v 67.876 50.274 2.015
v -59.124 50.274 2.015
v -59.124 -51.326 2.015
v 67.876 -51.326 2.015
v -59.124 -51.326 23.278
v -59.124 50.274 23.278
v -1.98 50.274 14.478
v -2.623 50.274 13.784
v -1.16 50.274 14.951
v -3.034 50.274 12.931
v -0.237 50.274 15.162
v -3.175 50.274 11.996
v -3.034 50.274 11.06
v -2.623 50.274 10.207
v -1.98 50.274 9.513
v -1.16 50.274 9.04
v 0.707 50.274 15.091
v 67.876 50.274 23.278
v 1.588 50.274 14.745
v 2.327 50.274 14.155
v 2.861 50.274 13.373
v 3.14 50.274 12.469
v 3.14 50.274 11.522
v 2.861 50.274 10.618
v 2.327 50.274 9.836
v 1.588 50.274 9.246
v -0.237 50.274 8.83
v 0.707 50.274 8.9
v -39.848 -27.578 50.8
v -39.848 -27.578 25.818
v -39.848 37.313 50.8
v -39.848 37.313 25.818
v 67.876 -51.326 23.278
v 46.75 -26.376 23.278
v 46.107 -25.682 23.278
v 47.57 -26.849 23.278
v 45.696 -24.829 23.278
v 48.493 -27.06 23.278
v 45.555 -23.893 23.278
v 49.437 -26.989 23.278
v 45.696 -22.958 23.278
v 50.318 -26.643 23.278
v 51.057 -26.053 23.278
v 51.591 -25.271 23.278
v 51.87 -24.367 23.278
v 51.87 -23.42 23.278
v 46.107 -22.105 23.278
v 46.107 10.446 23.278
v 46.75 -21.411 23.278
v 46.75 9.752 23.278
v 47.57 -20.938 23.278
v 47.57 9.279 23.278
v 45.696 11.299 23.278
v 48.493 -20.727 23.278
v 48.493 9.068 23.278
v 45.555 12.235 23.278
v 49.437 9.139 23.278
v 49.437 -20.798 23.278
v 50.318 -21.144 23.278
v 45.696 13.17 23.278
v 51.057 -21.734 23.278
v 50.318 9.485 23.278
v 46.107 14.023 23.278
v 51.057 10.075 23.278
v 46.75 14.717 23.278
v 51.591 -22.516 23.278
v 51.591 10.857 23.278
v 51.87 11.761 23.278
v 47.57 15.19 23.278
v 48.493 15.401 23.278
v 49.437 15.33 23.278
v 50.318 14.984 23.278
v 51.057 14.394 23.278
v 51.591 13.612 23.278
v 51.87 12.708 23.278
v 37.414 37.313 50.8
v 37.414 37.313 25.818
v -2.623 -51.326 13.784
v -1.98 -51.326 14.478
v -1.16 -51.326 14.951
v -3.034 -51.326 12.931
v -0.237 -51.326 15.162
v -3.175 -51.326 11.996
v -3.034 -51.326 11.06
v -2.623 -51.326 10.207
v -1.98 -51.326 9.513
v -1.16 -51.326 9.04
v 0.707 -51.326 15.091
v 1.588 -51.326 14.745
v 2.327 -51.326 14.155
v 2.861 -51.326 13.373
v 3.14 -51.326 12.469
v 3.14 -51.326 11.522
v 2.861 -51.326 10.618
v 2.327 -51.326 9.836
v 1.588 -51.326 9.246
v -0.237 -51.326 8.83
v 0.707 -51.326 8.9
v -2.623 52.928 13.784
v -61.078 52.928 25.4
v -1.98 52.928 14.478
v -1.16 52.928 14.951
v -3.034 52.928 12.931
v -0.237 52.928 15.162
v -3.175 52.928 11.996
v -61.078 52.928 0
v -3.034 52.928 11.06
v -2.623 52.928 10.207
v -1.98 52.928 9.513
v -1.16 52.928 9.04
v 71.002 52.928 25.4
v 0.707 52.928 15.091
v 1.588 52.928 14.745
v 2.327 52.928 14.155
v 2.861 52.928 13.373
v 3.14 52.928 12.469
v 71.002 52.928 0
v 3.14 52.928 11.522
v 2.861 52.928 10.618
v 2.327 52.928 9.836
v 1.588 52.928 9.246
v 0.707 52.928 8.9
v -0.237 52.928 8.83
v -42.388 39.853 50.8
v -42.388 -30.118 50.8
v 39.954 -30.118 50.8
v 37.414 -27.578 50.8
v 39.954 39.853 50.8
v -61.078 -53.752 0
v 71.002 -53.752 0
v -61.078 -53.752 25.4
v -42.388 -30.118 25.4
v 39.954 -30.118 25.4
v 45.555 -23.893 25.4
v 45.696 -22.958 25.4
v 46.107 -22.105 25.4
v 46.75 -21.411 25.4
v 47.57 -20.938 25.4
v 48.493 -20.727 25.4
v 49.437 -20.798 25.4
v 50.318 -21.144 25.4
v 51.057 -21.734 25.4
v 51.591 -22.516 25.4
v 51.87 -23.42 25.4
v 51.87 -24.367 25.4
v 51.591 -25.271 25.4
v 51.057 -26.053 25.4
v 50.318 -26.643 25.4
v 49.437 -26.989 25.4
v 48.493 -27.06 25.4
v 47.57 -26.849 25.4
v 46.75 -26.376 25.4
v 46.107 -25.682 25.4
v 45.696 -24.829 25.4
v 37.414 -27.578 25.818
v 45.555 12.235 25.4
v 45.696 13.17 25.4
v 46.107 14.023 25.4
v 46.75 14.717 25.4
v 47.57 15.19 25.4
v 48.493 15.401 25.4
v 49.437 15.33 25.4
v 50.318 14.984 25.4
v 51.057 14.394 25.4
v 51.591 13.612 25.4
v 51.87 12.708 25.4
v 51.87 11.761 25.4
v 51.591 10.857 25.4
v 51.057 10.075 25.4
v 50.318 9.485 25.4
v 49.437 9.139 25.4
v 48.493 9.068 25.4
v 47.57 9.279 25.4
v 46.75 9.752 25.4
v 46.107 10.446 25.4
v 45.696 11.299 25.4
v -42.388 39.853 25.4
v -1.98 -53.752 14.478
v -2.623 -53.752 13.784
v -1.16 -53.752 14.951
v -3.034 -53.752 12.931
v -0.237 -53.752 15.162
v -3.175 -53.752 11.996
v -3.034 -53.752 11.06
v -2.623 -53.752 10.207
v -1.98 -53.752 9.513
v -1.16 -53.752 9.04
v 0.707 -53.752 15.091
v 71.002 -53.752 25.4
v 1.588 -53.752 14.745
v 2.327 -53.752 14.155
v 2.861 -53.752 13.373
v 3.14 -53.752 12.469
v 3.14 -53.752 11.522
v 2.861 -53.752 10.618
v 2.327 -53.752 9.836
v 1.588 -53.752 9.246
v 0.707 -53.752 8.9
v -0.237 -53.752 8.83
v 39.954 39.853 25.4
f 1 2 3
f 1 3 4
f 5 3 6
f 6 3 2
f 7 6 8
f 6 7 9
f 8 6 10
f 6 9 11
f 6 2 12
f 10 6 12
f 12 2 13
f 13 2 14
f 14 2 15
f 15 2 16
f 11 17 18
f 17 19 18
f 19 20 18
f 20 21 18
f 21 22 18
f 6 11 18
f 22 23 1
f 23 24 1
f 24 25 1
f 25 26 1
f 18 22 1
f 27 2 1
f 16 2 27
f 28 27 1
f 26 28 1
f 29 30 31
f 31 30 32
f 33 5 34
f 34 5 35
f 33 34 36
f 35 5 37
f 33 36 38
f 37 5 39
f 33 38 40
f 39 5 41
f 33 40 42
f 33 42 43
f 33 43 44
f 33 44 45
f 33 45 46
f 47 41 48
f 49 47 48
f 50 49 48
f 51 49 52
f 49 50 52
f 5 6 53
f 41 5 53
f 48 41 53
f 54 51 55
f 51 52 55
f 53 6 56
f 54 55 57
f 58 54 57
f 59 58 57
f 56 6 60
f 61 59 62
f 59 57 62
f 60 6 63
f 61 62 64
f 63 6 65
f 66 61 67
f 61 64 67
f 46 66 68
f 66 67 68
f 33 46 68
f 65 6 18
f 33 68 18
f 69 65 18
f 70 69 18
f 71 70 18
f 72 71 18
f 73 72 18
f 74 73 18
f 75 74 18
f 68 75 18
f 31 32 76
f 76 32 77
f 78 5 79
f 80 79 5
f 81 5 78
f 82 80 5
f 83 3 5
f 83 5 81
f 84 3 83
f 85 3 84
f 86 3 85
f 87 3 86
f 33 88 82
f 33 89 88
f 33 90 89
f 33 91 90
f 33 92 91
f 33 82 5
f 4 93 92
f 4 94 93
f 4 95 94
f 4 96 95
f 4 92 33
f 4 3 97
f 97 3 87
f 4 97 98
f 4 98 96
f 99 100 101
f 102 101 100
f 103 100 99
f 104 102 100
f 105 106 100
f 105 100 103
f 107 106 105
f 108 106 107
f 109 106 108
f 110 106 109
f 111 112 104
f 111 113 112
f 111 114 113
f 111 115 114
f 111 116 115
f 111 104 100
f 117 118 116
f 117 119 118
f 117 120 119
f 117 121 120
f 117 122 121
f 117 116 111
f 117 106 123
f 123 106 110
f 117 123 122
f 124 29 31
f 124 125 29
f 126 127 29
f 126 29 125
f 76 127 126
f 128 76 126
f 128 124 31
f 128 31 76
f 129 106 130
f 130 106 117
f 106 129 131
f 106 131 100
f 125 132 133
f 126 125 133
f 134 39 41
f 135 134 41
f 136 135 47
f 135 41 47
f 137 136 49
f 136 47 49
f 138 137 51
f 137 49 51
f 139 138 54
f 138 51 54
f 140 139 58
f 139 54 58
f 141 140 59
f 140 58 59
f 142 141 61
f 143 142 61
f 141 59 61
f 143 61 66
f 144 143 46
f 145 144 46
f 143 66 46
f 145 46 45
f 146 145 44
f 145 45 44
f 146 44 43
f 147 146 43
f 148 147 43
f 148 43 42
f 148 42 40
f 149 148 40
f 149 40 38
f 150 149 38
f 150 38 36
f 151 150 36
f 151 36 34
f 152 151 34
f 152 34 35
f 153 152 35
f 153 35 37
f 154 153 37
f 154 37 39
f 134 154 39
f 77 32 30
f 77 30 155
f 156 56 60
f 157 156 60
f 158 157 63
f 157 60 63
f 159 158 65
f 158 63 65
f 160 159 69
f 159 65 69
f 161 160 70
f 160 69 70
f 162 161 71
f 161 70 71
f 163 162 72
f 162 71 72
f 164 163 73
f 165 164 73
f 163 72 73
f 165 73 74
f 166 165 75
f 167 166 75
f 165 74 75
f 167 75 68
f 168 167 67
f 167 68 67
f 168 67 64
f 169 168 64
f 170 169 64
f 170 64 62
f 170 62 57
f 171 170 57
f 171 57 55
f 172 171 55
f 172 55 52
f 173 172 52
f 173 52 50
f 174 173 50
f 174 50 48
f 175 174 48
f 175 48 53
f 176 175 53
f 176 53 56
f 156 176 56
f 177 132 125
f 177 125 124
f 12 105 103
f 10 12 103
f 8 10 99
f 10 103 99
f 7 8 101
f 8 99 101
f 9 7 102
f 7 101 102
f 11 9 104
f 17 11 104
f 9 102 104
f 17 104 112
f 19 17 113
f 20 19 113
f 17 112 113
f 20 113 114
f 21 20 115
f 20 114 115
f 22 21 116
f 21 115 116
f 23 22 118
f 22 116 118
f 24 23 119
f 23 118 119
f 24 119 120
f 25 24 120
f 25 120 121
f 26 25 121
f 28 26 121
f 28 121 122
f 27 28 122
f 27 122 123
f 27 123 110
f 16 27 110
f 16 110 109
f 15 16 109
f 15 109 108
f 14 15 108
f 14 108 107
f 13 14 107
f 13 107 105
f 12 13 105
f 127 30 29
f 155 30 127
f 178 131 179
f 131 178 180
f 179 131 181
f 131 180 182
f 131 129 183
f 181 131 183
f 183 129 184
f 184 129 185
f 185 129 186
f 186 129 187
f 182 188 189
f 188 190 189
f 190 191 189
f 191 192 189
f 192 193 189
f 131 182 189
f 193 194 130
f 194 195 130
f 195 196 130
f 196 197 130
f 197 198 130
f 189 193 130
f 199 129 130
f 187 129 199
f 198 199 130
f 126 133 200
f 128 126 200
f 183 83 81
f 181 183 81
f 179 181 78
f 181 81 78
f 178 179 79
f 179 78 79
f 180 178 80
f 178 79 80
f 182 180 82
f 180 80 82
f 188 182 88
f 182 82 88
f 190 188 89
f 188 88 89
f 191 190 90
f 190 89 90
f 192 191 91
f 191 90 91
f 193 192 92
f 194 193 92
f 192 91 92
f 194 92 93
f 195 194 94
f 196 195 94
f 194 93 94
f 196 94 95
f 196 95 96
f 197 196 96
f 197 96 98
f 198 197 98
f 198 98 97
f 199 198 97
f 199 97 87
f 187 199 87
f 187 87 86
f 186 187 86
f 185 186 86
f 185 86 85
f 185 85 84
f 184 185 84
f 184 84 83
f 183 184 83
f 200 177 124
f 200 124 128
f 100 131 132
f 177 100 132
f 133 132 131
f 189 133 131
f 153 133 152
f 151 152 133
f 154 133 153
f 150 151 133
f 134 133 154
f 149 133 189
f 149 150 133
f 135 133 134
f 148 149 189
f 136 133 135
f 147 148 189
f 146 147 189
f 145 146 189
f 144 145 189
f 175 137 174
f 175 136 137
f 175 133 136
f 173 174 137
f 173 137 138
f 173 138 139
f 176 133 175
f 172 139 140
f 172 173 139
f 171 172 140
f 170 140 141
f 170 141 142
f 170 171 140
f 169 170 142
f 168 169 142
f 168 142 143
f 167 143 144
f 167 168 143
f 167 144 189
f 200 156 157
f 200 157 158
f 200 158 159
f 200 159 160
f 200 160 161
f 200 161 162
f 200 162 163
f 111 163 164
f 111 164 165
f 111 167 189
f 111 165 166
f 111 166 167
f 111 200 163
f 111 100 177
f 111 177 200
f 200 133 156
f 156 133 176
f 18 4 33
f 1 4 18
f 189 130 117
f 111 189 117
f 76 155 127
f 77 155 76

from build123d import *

# Parameters (mm, degrees)
F0_W      = 132.08
F0_H      = 106.68
F0_W_2    = 127
F0_H_2    = 101.6
F1_DEPTH  = 25.4
F2_W      = 127
F2_H      = 2.0145024173
F3_DEPTH  = 101.6
F5_D      = 6.35
F2_H_2    = 2.122098887
F6_DEPTH  = 101.6
F7_W      = 82.3423601687
F7_H      = 69.9707251042
F7_W_2    = 76.2
F7_H_2    = 63.5
F8_DEPTH  = 25.4
F10_D     = 6.35
F10_DEPTH = 12.7
F10_TIP   = 1.9077324654
F11_T     = -2.54


with BuildPart() as f1:
    # F0 (on Top) → F1 (new body)
    with BuildSketch(Plane.XY):
        with Locations((4.9622115278, -0.4122621453)):
            Rectangle(F0_W, F0_H)
        with Locations((4.3762922287, -0.5259333495)):
            Rectangle(F0_W_2, F0_H_2, mode=Mode.SUBTRACT)
    extrude(amount=F1_DEPTH)

    # F2 (on face) → F3 (join)
    with BuildSketch(Plane.XZ.offset(-50.2740666505)):
        with Locations((4.3762922287, 1.0072512086)):
            Rectangle(F2_W, F2_H)
    extrude(amount=F3_DEPTH)

    # F5 (through all)
    with Locations(Plane.XZ.offset(53.7522621453)):
        with Locations((0, 11.9956443086)):
            Hole(F5_D / 2)

    # F2 (on face) → F6 (join)
    with BuildSketch(Plane.XZ.offset(-50.2740666505)):
        with Locations((4.3762922287, 24.3389505565)):
            Rectangle(F2_W, F2_H_2)
        with Locations((4.3762922287, 1.0072512086)):
            Rectangle(F2_W, F2_H)
    extrude(amount=F6_DEPTH)

    # F7 (on face) → F8 (join)
    with BuildSketch(Plane.XY.offset(25.4)):
        with Locations((-1.2168828398, 4.8675285652)):
            Rectangle(F7_W, F7_H)
        with Locations((-1.7157470335, 5.1717488095)):
            Rectangle(F7_W_2, F7_H_2, mode=Mode.SUBTRACT)
        with Locations((-1.7157470335, 5.1717488095)):
            Rectangle(F7_W_2, F7_H_2)
    extrude(amount=F8_DEPTH)

    # F10
    with Locations(Plane.XY.offset(25.4)):
        with Locations((48.7300269306, -23.8934792578), (48.7300269306, 12.2345555574)):
            Hole(F10_D / 2, depth=F10_DEPTH)
            with Locations((0, 0, -(F10_DEPTH + F10_TIP / 2))):  # 118° drill point
                Cone(0, F10_D / 2, F10_TIP, mode=Mode.SUBTRACT)

    # F11
    f11_openings = [f1.faces().sort_by_distance(p)[0] for p in [
        (-1.216883, 4.867529, 50.8),
    ]]
    offset(amount=F11_T, openings=f11_openings)


solid = f1.part
